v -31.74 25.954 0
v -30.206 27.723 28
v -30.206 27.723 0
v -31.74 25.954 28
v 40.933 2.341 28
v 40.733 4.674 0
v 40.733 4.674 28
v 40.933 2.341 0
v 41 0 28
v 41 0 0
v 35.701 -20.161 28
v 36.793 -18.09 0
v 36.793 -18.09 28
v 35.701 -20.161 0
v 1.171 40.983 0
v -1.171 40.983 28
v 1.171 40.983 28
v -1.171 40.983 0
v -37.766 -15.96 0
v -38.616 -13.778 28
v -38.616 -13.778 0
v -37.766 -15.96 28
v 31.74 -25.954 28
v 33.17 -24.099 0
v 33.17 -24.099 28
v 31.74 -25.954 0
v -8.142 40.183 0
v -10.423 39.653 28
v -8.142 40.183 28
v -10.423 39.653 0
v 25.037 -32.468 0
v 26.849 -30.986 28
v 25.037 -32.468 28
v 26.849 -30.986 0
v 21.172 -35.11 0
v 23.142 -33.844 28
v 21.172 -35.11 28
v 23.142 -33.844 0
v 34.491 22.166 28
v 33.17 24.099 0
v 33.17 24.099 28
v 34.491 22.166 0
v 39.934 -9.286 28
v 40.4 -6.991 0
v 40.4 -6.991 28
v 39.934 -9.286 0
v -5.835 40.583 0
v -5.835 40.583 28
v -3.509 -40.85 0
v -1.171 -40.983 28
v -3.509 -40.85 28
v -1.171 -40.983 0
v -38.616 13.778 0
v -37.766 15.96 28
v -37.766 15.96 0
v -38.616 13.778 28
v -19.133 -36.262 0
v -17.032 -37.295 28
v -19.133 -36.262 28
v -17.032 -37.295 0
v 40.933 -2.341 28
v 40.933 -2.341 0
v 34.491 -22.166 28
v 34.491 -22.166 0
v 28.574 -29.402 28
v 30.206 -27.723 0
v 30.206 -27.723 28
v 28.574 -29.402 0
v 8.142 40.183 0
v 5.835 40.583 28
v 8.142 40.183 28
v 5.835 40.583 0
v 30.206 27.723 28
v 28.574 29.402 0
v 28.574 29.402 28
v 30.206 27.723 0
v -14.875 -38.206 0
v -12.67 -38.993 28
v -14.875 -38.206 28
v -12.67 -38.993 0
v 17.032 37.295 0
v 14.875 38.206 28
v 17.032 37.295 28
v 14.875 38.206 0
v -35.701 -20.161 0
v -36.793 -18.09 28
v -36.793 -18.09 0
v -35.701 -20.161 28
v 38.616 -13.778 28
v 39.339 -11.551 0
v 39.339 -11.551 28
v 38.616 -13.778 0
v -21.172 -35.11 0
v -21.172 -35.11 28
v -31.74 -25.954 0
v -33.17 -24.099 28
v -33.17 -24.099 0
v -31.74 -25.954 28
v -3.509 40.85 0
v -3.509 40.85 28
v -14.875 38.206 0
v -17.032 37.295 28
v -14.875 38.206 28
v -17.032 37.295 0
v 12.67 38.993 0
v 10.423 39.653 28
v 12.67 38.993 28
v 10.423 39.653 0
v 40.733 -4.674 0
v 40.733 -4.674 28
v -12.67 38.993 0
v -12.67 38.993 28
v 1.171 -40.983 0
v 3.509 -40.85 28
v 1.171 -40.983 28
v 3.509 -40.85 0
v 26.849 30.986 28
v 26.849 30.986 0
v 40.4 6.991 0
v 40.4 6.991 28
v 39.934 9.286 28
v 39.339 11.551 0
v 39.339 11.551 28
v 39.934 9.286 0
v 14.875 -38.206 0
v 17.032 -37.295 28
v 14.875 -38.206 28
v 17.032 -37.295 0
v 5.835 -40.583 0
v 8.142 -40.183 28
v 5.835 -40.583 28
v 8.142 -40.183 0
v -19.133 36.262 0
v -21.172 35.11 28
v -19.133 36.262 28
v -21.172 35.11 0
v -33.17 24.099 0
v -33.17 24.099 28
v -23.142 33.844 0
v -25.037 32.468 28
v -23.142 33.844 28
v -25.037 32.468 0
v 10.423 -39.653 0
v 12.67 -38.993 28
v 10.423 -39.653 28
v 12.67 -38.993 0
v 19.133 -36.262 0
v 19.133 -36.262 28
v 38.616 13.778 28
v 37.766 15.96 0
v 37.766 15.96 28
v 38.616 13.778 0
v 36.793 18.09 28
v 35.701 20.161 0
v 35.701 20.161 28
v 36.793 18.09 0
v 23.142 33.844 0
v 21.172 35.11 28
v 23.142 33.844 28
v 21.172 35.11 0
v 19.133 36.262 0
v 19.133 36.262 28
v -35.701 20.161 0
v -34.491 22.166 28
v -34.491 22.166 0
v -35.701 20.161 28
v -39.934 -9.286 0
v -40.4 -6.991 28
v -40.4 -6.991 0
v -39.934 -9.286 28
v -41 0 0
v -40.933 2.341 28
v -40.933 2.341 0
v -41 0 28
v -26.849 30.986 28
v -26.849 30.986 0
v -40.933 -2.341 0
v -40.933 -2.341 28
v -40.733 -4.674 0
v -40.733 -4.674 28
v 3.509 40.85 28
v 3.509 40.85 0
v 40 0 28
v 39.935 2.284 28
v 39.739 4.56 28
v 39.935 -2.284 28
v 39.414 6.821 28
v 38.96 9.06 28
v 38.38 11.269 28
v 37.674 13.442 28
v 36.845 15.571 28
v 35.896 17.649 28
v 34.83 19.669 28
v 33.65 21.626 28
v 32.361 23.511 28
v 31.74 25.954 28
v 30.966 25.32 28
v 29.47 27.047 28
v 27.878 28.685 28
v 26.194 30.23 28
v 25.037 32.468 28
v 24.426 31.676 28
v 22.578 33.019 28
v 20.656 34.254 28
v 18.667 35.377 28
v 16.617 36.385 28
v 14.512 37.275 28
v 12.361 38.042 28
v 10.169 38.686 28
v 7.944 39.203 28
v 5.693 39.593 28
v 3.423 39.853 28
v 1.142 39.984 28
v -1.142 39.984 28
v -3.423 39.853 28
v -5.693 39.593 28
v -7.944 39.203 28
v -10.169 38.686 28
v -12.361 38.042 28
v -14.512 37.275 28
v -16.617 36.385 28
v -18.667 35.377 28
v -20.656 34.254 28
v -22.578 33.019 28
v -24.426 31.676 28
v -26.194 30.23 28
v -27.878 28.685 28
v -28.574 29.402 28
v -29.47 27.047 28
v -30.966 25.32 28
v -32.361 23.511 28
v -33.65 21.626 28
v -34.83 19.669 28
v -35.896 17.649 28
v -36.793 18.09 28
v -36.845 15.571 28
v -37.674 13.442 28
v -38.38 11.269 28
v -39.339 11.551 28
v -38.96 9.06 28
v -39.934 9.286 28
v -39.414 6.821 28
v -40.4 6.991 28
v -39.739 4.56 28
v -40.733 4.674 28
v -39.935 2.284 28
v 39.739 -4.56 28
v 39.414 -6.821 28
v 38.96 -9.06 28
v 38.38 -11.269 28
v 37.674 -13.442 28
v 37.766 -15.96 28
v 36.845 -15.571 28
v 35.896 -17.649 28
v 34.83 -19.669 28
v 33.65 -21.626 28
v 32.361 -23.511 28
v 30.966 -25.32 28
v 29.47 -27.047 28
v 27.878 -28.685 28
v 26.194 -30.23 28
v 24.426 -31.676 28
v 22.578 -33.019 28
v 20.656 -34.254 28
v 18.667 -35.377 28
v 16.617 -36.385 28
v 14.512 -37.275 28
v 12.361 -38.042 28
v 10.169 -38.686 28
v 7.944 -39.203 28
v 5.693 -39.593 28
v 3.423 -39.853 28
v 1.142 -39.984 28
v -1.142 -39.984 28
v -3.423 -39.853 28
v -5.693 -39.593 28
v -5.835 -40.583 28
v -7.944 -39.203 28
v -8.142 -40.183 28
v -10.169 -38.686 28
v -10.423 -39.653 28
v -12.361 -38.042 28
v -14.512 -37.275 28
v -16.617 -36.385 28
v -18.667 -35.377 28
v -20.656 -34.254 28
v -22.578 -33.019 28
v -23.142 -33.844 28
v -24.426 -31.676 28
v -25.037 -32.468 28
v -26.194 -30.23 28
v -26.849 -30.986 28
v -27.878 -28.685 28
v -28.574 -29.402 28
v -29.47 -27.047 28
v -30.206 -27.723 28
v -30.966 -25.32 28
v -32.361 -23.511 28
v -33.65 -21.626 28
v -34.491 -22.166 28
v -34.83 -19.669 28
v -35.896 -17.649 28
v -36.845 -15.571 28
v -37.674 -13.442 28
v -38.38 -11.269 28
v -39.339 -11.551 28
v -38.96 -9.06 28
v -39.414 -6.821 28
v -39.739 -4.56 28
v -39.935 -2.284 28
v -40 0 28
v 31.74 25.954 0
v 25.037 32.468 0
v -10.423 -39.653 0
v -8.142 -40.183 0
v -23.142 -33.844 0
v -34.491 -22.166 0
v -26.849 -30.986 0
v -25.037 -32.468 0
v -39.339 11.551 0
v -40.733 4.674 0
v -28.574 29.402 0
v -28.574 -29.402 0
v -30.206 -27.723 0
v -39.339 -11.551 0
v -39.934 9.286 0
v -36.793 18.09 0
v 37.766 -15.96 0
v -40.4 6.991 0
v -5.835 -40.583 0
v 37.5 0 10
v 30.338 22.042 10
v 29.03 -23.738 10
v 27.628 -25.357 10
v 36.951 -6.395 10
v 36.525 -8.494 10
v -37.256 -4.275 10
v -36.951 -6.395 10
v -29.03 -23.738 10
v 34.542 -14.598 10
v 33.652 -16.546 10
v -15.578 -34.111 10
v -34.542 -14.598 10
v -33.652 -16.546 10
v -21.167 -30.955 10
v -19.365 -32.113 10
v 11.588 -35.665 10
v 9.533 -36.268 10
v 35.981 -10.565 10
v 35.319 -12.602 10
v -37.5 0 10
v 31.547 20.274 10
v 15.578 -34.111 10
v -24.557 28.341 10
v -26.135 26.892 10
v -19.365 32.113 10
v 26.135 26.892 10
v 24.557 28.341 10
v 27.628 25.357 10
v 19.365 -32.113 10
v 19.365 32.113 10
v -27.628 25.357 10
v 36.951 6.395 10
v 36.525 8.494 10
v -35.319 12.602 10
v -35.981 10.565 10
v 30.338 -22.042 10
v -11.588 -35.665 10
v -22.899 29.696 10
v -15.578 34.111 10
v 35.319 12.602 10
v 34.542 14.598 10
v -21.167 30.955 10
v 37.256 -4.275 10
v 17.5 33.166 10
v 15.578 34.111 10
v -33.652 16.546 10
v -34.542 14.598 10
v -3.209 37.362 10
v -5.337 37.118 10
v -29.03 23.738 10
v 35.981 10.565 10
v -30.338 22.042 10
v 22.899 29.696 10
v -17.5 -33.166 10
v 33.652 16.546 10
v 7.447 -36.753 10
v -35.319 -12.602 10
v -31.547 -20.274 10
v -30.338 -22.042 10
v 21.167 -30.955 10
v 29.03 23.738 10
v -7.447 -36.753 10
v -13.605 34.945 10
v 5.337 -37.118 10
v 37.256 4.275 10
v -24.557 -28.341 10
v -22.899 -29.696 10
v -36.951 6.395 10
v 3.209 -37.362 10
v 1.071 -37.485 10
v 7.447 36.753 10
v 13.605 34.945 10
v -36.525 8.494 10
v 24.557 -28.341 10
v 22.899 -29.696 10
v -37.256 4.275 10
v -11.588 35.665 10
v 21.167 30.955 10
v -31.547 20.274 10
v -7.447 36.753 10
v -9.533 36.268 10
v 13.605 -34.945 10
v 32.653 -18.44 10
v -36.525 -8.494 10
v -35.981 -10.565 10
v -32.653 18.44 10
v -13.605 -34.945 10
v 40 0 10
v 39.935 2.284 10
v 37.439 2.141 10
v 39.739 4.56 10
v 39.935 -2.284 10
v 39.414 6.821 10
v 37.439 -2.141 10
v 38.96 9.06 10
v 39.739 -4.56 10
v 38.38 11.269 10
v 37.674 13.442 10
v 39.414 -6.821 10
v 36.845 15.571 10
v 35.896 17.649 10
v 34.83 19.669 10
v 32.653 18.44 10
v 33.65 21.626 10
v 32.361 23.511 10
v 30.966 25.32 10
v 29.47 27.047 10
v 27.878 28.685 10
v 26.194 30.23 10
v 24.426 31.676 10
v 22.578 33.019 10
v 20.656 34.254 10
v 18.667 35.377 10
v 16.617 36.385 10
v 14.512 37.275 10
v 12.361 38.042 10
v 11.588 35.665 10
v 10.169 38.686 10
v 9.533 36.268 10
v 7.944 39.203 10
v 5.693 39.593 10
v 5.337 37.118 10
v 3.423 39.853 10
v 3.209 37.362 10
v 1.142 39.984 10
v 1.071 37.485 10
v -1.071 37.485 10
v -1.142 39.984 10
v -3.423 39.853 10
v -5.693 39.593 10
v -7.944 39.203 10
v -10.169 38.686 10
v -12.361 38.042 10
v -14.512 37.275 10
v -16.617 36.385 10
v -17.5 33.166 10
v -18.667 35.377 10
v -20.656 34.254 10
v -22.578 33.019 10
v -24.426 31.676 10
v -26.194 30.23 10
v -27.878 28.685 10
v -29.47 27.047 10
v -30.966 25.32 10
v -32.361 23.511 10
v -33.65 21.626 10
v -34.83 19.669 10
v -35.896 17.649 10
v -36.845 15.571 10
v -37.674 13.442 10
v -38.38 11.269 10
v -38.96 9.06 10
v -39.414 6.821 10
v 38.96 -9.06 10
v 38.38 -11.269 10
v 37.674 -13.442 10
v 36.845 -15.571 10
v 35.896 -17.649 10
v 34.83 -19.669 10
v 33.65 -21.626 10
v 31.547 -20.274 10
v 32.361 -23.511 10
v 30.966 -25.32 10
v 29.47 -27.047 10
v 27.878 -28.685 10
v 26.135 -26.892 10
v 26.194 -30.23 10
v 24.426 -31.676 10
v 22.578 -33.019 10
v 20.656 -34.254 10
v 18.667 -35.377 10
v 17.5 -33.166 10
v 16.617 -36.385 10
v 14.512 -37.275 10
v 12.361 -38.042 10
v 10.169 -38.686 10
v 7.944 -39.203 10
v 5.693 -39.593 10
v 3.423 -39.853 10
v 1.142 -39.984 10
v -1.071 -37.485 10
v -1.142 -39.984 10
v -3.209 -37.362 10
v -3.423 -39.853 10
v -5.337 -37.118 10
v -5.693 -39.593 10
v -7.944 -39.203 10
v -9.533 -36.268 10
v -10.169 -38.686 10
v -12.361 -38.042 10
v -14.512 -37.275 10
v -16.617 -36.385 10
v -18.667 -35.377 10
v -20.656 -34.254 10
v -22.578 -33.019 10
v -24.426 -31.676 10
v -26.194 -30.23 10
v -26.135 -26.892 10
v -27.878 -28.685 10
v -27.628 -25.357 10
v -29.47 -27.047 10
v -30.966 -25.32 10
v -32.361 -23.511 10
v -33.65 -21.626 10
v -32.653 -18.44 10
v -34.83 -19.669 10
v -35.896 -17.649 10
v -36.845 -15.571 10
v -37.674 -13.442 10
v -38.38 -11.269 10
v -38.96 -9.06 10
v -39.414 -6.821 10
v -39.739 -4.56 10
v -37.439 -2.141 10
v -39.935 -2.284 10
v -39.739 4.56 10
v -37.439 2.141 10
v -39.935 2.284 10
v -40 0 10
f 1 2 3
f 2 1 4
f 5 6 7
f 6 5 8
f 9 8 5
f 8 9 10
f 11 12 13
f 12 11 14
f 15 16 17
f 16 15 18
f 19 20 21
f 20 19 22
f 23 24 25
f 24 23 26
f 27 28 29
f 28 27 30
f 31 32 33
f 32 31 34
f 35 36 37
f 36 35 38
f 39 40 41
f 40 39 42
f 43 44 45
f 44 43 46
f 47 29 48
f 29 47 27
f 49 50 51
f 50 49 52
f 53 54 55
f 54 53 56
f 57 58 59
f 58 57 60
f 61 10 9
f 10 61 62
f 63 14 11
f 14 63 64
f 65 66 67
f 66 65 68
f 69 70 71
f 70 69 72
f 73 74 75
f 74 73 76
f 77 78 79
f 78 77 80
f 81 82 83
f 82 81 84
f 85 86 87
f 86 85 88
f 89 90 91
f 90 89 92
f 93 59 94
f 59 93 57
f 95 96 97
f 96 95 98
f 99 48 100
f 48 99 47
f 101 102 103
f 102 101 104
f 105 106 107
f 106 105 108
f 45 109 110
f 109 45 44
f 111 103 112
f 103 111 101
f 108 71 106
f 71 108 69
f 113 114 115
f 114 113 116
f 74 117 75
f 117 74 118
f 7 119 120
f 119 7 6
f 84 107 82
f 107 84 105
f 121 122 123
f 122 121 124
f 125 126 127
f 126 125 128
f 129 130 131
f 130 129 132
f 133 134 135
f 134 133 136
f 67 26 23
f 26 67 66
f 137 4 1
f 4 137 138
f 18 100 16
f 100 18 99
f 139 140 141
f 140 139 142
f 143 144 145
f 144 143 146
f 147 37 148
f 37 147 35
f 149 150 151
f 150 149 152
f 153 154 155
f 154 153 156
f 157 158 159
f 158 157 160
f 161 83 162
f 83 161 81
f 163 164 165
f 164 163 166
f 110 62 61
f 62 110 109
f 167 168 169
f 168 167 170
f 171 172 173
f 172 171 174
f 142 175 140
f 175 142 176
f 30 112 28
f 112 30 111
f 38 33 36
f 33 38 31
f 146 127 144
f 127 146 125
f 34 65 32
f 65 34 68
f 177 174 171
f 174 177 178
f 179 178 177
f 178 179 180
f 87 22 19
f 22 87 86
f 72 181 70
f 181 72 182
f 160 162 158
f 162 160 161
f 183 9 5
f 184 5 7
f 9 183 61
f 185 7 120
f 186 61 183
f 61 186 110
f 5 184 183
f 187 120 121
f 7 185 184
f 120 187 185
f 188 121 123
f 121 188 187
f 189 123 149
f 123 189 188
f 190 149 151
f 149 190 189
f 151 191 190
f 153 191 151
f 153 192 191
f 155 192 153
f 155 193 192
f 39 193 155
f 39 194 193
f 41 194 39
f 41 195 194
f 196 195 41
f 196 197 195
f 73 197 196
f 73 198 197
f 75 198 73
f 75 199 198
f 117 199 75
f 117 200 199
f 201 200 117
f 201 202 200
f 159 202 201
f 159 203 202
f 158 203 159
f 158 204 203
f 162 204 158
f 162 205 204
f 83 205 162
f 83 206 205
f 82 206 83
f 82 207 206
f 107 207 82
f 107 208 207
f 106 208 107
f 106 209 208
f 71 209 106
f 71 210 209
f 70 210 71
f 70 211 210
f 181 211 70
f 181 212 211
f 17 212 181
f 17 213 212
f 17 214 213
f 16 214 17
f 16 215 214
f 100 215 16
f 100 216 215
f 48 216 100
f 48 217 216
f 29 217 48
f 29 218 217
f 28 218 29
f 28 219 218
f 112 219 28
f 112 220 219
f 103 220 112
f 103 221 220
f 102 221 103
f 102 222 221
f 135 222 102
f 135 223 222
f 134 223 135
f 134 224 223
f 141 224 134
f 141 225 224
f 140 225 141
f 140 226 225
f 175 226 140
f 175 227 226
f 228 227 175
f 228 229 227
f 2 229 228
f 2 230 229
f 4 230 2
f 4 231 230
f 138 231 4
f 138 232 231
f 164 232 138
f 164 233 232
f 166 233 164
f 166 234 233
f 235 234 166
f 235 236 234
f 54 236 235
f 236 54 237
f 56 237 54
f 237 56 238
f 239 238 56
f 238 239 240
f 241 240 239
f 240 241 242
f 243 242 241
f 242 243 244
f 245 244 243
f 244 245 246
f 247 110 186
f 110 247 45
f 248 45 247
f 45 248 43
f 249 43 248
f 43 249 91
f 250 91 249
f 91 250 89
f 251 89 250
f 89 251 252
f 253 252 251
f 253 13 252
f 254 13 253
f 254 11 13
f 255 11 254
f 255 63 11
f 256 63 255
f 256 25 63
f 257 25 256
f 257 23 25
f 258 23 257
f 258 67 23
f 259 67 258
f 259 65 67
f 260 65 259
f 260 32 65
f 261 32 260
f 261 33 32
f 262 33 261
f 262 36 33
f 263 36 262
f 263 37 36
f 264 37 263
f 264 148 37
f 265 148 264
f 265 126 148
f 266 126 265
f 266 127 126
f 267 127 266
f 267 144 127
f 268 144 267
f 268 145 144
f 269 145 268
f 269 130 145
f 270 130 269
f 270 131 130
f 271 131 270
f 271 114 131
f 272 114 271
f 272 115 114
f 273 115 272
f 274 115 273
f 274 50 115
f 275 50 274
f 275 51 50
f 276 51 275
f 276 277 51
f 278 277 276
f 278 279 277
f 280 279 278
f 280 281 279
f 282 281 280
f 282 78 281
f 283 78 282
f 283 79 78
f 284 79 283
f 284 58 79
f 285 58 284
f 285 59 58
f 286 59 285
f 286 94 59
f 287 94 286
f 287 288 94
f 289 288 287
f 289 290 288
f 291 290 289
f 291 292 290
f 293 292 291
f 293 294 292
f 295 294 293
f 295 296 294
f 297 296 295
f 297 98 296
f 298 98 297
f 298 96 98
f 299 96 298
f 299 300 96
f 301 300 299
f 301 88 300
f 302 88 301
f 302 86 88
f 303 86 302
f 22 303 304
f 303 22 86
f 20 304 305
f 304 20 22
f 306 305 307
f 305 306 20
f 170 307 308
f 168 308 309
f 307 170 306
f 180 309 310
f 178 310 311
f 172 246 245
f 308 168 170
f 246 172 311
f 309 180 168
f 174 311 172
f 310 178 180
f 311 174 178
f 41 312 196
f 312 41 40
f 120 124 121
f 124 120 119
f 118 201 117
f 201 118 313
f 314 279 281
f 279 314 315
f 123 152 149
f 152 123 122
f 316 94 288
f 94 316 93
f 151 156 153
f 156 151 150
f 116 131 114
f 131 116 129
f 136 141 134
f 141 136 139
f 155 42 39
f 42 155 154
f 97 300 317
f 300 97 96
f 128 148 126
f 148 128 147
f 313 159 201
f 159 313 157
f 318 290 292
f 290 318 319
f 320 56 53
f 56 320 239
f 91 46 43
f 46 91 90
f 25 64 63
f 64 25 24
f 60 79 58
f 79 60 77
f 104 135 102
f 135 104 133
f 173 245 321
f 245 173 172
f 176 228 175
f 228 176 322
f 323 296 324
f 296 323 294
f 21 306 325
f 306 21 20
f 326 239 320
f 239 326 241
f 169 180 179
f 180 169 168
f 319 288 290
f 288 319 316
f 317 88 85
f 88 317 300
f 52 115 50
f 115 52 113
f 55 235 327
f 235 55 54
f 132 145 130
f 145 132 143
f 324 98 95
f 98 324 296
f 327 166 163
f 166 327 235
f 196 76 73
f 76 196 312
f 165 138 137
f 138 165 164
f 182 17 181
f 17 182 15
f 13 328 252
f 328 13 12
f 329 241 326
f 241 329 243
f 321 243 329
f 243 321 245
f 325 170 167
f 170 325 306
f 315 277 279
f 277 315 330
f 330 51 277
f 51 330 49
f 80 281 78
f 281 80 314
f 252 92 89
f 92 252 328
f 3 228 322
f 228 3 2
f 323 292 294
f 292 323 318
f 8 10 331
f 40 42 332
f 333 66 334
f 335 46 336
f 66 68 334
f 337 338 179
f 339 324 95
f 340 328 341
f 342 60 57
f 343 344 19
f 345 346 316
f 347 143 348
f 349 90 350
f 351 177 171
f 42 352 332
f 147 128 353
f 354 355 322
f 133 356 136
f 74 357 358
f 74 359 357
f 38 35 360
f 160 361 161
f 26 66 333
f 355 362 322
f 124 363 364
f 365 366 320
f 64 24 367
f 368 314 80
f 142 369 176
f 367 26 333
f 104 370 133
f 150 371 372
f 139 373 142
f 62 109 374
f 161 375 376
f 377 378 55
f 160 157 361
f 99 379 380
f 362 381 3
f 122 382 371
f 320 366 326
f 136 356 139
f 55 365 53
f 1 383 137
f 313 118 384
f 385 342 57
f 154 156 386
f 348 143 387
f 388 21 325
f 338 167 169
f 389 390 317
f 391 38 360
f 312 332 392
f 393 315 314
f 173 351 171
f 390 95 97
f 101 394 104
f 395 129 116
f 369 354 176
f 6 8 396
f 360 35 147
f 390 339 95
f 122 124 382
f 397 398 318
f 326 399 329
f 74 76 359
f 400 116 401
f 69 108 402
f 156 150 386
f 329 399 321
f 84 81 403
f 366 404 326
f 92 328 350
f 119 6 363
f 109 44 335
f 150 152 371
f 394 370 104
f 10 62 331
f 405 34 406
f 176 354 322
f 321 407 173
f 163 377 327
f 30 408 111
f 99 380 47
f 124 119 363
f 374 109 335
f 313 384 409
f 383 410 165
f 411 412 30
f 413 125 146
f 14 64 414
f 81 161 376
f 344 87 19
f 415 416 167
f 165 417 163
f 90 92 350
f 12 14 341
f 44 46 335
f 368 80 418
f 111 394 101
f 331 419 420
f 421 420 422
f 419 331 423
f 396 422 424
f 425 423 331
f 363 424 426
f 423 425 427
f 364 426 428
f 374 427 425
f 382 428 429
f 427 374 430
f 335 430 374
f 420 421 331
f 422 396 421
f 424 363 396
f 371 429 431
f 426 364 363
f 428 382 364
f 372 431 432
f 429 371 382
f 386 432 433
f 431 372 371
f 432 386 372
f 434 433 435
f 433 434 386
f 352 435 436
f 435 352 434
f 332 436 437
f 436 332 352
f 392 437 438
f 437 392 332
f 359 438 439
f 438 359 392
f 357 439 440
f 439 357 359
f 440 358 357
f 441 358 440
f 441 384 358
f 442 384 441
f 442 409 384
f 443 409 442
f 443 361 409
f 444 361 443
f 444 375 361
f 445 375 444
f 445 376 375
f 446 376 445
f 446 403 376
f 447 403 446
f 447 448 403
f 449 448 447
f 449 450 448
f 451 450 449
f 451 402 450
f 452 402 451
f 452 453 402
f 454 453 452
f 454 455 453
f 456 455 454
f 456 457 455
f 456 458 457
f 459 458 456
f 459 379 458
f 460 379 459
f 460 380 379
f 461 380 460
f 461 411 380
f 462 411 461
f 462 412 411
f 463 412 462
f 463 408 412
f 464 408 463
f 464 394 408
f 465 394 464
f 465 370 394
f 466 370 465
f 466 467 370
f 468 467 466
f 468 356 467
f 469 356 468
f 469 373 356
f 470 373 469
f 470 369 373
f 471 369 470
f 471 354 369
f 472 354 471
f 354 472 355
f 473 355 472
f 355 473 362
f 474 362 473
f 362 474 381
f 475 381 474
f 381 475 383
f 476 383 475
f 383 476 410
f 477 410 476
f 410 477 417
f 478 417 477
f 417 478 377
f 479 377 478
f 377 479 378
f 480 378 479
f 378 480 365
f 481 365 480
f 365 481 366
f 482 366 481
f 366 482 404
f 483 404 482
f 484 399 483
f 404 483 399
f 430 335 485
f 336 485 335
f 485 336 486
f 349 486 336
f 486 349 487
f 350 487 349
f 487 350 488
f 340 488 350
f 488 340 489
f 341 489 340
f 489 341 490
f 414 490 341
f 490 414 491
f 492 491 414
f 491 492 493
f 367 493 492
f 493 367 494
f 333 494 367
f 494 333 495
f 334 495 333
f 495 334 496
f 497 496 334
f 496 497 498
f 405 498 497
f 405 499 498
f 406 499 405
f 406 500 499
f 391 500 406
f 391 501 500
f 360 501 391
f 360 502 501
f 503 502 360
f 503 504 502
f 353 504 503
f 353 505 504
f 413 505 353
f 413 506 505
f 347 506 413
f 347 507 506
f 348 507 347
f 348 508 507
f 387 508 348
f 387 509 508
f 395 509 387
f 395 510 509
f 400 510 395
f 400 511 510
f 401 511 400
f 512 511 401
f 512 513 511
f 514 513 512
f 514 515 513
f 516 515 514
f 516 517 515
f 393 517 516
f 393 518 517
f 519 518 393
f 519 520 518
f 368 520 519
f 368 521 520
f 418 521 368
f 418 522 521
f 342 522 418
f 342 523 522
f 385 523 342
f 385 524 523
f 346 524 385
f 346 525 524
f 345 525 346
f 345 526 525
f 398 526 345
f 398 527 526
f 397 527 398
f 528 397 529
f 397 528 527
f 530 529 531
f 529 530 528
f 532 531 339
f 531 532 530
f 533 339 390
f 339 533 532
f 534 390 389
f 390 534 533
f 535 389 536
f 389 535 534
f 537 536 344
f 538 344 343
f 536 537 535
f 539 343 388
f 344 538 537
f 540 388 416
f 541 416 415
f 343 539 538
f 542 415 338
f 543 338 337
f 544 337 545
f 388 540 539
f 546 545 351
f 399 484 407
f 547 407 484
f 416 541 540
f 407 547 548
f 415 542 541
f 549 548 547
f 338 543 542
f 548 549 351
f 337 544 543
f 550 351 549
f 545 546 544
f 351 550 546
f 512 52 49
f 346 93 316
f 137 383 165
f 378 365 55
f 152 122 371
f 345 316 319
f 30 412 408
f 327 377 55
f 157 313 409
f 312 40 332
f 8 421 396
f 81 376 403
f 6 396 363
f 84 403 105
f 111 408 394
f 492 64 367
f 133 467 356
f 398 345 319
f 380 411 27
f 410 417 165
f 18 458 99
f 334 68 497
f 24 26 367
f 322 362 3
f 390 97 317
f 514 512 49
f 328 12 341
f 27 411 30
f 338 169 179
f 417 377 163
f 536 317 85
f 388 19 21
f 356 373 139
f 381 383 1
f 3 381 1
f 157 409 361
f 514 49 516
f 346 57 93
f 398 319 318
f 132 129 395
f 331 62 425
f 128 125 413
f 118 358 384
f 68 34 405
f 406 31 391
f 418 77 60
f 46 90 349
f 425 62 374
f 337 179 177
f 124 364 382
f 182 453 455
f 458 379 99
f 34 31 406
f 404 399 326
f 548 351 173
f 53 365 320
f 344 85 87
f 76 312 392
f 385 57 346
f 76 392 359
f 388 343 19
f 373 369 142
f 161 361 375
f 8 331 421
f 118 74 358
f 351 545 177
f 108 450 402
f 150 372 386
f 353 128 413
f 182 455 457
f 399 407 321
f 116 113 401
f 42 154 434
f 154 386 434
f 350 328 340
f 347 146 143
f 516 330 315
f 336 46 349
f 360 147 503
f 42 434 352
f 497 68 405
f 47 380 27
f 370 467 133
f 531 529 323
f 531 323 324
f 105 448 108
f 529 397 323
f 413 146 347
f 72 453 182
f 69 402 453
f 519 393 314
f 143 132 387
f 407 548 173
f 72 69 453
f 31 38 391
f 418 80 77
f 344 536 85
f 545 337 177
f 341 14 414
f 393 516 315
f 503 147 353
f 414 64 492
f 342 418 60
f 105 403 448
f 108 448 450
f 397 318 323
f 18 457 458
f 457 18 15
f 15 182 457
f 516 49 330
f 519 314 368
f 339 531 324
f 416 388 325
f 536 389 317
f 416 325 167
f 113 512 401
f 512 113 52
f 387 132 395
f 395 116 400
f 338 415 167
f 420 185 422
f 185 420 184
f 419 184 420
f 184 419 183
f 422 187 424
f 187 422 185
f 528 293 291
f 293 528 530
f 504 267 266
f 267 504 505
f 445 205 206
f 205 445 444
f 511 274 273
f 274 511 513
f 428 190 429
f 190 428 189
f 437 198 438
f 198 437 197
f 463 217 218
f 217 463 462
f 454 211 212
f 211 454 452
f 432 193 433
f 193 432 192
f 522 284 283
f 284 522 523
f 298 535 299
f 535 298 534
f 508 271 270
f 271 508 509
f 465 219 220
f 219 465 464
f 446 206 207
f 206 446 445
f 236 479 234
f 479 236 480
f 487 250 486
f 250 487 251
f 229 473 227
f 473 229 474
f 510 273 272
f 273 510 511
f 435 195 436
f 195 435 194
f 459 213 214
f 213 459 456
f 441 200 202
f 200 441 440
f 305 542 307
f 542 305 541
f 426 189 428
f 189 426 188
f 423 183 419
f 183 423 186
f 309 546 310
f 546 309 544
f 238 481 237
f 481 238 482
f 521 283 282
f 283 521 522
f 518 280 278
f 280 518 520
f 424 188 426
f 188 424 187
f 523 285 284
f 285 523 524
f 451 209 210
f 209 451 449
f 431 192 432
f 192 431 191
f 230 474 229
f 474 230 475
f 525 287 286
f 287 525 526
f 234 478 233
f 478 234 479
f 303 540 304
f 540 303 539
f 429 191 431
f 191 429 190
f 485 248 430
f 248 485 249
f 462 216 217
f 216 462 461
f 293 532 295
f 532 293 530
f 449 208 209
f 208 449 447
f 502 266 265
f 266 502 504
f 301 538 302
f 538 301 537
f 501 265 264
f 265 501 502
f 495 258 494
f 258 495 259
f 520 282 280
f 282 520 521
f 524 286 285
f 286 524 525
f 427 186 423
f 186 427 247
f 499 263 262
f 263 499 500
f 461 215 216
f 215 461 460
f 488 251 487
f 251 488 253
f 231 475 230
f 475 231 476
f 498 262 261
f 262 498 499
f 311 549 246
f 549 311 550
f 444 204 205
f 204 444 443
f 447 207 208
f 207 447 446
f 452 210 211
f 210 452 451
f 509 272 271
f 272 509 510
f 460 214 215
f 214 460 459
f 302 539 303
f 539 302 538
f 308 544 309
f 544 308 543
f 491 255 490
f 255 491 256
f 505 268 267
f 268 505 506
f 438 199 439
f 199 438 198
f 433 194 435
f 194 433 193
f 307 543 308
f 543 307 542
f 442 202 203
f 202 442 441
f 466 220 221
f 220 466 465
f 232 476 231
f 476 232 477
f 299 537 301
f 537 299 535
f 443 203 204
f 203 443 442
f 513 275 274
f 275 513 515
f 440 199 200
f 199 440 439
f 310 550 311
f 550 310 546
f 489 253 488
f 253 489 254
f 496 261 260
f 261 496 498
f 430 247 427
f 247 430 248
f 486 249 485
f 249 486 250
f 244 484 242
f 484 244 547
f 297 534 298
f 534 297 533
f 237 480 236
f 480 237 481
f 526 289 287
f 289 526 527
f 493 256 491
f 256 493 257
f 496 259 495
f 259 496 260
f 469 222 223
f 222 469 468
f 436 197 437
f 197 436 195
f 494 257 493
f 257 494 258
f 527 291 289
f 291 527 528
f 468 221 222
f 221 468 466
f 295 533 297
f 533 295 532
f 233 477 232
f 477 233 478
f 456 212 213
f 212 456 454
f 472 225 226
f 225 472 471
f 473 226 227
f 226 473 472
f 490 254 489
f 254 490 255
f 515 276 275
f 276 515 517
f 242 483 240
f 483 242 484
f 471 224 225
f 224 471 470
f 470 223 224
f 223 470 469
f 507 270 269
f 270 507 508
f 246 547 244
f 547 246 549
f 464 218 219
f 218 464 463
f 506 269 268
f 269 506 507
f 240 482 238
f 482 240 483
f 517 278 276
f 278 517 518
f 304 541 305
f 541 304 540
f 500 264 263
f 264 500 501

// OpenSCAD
//luftrör
h1=10;
h2=18;
ytterradie=82/2;
innerradie=80/2;
klackradie=75/2;
res=110;

difference(){
	cylinder(h=h1+h2, r=ytterradie, $fn=res);
	cylinder(h=h1, r1=ytterradie, r2=klackradie, $fn=res);
	translate([0,0,h1])
	cylinder(h=h2, r=innerradie, $fn=res);
}
